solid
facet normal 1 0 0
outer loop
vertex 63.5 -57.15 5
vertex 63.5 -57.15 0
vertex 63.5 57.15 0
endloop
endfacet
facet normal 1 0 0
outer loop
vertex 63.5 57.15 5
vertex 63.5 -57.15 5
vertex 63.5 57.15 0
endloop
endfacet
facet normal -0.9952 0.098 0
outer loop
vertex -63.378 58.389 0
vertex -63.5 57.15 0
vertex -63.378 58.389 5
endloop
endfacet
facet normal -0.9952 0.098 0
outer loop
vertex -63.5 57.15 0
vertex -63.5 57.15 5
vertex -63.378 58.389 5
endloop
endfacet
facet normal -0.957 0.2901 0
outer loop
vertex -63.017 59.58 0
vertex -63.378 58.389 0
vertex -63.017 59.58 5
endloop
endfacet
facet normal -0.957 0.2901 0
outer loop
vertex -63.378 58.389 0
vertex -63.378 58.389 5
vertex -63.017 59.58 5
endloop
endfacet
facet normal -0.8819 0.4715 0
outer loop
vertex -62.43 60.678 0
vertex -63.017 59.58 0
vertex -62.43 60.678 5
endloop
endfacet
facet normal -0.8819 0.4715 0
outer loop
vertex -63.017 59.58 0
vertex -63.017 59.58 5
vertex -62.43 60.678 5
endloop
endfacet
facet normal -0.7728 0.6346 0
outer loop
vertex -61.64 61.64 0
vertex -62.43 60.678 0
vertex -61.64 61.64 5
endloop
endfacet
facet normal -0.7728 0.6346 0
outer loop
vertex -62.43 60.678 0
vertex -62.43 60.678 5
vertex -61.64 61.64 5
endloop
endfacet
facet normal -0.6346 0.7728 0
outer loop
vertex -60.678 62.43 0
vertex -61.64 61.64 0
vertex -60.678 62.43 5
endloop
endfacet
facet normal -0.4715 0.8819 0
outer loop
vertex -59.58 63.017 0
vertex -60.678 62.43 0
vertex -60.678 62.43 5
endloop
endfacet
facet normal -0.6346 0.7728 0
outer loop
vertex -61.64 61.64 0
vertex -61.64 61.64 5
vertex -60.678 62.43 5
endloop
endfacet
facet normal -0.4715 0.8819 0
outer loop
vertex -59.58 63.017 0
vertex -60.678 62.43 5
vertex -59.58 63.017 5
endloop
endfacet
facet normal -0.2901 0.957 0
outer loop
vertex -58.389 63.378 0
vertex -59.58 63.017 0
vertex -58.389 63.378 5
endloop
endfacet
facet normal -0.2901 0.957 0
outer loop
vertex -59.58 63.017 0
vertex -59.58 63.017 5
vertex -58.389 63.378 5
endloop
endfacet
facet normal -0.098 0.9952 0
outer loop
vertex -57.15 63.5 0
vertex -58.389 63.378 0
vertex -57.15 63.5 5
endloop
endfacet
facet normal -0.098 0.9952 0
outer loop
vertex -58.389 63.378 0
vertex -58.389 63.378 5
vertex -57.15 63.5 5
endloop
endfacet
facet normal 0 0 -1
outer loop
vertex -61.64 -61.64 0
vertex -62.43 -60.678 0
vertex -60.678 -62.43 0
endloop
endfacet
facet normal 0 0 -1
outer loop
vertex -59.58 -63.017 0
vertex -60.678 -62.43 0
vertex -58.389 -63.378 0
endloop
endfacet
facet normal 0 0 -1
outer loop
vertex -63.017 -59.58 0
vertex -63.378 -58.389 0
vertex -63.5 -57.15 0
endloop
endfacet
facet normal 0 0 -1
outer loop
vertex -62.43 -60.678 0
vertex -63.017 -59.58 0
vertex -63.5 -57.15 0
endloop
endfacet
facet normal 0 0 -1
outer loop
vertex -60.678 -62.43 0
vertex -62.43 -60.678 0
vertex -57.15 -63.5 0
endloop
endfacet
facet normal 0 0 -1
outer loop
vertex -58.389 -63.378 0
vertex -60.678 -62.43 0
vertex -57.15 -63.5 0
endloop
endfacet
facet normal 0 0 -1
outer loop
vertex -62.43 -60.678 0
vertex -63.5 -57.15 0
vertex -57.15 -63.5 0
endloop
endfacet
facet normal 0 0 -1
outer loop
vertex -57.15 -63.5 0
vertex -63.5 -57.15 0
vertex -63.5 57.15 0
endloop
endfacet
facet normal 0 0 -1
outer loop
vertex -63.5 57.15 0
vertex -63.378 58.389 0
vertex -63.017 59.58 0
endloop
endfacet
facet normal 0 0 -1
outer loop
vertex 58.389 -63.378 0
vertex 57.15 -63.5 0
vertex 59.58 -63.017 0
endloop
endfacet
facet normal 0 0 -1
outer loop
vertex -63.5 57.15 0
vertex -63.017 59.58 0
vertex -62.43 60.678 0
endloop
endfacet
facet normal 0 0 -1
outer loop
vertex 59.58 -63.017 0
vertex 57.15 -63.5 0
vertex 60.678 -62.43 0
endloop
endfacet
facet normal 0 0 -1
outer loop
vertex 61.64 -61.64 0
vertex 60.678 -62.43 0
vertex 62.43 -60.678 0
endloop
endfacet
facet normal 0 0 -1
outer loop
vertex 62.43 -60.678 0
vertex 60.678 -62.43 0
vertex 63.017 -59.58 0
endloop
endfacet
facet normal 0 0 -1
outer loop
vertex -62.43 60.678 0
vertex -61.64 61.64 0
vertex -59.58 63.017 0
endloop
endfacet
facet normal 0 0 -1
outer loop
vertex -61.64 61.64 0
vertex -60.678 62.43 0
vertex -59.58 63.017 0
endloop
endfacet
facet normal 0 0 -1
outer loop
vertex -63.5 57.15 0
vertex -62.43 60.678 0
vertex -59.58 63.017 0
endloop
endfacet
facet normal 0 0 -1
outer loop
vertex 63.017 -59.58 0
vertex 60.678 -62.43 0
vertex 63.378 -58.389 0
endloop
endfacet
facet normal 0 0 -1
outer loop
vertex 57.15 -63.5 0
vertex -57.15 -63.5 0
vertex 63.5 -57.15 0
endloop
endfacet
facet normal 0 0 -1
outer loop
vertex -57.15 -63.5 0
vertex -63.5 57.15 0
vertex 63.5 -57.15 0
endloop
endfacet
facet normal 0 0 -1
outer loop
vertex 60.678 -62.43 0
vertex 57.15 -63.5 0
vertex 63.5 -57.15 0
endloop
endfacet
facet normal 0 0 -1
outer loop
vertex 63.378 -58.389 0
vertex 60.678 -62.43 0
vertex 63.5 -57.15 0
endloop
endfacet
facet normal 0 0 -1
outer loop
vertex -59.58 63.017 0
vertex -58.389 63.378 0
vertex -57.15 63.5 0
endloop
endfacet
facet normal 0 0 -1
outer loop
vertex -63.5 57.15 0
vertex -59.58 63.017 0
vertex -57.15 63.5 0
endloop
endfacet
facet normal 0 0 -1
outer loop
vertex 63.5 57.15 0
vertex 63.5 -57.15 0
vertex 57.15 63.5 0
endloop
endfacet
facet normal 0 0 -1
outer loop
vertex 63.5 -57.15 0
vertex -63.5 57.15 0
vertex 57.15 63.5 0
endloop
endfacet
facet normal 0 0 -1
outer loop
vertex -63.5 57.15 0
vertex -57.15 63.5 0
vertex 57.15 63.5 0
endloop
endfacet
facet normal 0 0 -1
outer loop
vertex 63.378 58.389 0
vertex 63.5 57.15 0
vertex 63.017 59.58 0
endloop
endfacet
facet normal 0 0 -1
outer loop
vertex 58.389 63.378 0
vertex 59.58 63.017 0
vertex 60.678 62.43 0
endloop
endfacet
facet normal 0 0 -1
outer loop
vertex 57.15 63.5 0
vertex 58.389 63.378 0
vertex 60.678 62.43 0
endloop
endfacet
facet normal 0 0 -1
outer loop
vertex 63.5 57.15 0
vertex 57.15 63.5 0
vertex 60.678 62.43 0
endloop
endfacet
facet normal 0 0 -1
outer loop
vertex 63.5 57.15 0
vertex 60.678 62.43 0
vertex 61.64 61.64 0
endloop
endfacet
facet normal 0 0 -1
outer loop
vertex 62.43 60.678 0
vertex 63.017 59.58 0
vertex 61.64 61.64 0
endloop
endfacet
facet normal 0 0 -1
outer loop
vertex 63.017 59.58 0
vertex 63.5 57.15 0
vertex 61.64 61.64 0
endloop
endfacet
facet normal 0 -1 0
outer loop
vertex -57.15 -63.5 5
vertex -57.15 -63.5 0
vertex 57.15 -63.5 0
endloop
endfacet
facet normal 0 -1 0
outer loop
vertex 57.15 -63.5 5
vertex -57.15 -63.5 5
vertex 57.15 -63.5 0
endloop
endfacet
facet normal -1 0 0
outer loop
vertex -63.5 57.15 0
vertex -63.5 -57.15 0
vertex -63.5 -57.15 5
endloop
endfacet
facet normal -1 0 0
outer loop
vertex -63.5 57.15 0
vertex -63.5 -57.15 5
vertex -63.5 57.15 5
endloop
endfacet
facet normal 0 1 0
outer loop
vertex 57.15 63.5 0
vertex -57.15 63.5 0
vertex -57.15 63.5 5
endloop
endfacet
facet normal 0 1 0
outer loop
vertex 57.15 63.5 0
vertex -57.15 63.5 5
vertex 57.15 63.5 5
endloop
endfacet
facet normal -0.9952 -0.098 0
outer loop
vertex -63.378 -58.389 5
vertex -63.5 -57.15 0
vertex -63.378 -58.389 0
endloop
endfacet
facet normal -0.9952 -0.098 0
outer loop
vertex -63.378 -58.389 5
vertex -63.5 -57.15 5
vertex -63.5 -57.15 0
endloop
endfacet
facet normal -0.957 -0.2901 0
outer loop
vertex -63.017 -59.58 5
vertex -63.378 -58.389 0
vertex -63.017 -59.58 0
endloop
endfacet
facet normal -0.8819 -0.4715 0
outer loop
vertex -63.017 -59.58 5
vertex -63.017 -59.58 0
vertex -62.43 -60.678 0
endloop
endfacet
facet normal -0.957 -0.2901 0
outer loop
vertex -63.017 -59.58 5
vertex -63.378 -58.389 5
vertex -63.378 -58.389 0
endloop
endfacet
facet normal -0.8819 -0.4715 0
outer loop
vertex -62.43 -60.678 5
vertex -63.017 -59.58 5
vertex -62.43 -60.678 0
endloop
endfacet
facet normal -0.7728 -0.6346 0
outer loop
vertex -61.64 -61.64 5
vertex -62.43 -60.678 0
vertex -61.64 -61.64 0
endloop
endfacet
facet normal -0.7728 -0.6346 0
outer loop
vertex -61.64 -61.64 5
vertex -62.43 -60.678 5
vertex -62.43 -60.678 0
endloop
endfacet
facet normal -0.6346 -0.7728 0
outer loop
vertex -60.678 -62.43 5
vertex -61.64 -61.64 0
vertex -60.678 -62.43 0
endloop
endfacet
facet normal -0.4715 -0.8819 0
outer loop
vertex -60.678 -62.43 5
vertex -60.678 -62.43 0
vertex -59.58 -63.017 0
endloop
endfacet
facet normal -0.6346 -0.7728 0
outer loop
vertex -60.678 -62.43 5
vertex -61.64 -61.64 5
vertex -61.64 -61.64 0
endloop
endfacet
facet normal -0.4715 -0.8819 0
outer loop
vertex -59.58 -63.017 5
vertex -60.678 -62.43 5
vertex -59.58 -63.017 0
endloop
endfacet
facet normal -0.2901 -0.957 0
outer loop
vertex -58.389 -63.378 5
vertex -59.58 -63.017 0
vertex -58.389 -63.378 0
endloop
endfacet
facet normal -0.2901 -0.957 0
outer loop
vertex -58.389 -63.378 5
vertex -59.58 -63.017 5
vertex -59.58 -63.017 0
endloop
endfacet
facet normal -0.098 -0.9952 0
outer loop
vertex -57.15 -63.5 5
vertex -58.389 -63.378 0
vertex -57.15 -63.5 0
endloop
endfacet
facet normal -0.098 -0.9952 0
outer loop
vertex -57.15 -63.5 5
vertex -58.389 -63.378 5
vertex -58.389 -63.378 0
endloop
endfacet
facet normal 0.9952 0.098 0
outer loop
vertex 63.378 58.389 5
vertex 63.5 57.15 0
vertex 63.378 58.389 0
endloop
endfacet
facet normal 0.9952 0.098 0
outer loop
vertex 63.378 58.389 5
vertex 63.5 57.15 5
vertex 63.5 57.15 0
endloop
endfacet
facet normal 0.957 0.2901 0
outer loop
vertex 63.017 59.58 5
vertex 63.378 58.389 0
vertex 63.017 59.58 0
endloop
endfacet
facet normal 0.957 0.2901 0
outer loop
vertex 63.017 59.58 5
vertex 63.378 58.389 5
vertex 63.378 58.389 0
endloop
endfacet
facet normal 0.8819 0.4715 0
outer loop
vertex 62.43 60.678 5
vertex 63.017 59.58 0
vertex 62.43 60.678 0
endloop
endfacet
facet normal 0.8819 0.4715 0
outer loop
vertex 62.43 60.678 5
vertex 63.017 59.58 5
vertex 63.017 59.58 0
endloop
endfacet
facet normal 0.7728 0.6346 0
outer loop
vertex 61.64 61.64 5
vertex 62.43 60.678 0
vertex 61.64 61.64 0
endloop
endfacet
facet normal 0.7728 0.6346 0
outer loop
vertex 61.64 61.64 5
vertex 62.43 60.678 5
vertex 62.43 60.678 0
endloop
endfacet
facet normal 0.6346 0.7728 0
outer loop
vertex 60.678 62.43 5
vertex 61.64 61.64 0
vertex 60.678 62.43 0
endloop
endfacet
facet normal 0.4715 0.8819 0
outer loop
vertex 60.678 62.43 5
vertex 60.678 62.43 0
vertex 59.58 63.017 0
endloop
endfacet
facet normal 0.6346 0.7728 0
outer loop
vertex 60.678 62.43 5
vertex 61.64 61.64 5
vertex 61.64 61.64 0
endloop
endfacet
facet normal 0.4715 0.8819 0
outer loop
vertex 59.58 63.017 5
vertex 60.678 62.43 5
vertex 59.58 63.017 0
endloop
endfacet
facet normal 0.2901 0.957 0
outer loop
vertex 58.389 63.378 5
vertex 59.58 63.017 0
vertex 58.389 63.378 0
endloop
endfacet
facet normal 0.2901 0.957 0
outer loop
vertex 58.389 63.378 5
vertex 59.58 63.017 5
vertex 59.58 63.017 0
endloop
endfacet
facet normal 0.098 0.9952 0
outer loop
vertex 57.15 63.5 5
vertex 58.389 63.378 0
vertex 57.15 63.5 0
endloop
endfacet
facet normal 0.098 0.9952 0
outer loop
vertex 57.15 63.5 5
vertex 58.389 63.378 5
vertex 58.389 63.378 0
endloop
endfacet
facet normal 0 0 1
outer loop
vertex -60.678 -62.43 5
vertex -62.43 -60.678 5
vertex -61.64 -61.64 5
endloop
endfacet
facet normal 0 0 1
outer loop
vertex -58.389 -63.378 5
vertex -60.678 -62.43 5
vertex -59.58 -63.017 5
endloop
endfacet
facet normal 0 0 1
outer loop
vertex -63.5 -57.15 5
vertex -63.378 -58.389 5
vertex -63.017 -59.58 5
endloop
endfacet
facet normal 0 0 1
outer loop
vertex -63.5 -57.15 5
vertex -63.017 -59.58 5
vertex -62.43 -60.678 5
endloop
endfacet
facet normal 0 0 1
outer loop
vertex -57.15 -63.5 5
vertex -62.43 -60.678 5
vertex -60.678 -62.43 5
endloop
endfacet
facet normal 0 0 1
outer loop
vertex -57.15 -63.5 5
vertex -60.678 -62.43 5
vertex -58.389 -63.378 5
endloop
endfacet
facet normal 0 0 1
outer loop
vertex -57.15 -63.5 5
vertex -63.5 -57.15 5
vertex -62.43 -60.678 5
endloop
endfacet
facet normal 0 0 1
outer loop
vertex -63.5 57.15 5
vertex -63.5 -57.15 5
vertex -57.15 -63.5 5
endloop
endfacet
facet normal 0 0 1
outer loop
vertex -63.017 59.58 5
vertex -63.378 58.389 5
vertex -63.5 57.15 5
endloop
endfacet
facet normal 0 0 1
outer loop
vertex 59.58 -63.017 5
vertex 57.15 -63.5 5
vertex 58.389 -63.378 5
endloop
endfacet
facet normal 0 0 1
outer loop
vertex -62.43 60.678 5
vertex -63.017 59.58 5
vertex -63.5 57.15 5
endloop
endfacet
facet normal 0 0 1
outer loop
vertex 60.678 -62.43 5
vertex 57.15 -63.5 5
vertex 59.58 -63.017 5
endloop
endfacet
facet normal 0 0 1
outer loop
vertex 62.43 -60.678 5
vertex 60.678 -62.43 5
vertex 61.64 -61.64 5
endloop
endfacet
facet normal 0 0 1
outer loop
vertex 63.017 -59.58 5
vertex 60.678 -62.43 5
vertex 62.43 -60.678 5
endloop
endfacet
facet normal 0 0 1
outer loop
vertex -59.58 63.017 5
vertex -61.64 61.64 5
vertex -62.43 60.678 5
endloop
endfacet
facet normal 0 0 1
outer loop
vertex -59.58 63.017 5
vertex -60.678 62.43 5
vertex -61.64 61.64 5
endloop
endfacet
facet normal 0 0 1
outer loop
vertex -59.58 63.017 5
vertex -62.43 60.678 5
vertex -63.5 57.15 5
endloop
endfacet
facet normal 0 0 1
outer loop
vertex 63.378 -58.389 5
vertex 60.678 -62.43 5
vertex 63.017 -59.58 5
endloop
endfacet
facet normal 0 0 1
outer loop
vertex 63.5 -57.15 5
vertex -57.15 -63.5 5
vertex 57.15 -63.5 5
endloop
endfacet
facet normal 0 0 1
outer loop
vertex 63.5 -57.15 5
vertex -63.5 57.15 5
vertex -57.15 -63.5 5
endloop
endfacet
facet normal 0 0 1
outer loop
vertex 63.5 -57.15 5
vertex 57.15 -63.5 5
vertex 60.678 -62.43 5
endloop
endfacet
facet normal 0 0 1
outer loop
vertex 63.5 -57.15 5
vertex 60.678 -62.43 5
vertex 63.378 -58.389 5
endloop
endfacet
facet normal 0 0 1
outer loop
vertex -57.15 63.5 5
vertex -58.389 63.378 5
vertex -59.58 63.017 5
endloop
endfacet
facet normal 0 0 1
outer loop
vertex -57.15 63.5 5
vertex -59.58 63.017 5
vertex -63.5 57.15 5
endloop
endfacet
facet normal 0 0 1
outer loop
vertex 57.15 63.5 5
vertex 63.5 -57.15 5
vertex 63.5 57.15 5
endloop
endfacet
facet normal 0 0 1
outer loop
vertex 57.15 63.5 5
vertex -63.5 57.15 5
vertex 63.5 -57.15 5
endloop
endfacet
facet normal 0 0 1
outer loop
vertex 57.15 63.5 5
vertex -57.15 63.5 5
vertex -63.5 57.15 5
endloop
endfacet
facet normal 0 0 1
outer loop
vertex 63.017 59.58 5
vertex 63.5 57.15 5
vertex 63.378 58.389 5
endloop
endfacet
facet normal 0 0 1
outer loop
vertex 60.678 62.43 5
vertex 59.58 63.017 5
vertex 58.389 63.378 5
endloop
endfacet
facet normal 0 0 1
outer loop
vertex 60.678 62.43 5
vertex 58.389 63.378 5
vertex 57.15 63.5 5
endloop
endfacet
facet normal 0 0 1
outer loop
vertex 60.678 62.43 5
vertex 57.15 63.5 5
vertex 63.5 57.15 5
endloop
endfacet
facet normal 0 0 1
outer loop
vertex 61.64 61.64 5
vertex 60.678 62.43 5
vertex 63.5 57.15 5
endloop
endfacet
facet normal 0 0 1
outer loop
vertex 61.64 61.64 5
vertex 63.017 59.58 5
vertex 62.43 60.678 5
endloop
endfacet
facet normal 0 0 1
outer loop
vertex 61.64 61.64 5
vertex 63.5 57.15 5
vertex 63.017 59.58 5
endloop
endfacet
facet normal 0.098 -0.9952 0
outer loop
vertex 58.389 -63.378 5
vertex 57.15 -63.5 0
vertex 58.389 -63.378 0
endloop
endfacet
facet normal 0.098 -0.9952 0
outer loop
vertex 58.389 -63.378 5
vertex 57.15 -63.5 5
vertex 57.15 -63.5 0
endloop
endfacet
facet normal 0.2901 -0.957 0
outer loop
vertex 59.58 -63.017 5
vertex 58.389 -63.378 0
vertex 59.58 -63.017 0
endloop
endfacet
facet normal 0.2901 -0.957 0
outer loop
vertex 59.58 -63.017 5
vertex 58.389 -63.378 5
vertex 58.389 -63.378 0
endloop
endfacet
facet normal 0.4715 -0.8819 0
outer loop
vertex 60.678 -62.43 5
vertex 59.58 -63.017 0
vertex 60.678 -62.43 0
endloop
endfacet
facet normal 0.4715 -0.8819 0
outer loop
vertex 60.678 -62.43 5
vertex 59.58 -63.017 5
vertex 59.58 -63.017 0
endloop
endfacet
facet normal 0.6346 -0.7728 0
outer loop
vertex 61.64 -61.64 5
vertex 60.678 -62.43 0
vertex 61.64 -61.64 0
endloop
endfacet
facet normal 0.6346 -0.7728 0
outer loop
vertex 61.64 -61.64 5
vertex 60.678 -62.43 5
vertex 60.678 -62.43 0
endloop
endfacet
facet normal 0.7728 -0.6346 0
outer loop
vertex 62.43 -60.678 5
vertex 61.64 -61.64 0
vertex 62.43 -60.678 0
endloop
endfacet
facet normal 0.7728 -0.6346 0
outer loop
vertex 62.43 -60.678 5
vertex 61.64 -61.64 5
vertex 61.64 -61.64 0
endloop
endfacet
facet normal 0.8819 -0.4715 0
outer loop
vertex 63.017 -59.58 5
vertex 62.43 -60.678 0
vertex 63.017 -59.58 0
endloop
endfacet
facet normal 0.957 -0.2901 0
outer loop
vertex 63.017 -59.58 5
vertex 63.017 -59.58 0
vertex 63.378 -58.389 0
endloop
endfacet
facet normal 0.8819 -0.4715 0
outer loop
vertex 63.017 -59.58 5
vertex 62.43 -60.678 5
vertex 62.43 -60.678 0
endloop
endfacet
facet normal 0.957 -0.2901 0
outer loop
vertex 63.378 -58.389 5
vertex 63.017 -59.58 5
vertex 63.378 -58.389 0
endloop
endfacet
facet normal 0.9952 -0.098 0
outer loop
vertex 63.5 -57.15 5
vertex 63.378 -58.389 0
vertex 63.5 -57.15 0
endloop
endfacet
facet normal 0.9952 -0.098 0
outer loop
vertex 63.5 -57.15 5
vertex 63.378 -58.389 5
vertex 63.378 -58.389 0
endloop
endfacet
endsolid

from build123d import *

# Parameters (mm, degrees)
SKETCH1_W           = 127
SKETCH1_H           = 127
SKETCH1_W_2         = 121
SKETCH1_H_2         = 121
SKETCH1_R           = 38.5
BOSS_EXTRUDE1_DEPTH = 5
FILLET1_R           = 6.35


with BuildPart() as part:
    # Sketch1 → Boss-Extrude1 (new body)
    with BuildSketch(Plane.XY):
        Rectangle(SKETCH1_W, SKETCH1_H)
        Rectangle(SKETCH1_W_2, SKETCH1_H_2, mode=Mode.SUBTRACT)
        Rectangle(SKETCH1_W_2, SKETCH1_H_2)
        Circle(SKETCH1_R, mode=Mode.SUBTRACT)
        Circle(SKETCH1_R)
    extrude(amount=BOSS_EXTRUDE1_DEPTH)

    # Fillet1
    fillet1_edges = [part.edges().sort_by_distance(p)[0] for p in [
        (-63.5, 63.5, 2.5),
        (63.5, 63.5, 2.5),
        (63.5, -63.5, 2.5),
        (-63.5, -63.5, 2.5),
    ]]
    fillet(fillet1_edges, radius=FILLET1_R)


solid = part.part
